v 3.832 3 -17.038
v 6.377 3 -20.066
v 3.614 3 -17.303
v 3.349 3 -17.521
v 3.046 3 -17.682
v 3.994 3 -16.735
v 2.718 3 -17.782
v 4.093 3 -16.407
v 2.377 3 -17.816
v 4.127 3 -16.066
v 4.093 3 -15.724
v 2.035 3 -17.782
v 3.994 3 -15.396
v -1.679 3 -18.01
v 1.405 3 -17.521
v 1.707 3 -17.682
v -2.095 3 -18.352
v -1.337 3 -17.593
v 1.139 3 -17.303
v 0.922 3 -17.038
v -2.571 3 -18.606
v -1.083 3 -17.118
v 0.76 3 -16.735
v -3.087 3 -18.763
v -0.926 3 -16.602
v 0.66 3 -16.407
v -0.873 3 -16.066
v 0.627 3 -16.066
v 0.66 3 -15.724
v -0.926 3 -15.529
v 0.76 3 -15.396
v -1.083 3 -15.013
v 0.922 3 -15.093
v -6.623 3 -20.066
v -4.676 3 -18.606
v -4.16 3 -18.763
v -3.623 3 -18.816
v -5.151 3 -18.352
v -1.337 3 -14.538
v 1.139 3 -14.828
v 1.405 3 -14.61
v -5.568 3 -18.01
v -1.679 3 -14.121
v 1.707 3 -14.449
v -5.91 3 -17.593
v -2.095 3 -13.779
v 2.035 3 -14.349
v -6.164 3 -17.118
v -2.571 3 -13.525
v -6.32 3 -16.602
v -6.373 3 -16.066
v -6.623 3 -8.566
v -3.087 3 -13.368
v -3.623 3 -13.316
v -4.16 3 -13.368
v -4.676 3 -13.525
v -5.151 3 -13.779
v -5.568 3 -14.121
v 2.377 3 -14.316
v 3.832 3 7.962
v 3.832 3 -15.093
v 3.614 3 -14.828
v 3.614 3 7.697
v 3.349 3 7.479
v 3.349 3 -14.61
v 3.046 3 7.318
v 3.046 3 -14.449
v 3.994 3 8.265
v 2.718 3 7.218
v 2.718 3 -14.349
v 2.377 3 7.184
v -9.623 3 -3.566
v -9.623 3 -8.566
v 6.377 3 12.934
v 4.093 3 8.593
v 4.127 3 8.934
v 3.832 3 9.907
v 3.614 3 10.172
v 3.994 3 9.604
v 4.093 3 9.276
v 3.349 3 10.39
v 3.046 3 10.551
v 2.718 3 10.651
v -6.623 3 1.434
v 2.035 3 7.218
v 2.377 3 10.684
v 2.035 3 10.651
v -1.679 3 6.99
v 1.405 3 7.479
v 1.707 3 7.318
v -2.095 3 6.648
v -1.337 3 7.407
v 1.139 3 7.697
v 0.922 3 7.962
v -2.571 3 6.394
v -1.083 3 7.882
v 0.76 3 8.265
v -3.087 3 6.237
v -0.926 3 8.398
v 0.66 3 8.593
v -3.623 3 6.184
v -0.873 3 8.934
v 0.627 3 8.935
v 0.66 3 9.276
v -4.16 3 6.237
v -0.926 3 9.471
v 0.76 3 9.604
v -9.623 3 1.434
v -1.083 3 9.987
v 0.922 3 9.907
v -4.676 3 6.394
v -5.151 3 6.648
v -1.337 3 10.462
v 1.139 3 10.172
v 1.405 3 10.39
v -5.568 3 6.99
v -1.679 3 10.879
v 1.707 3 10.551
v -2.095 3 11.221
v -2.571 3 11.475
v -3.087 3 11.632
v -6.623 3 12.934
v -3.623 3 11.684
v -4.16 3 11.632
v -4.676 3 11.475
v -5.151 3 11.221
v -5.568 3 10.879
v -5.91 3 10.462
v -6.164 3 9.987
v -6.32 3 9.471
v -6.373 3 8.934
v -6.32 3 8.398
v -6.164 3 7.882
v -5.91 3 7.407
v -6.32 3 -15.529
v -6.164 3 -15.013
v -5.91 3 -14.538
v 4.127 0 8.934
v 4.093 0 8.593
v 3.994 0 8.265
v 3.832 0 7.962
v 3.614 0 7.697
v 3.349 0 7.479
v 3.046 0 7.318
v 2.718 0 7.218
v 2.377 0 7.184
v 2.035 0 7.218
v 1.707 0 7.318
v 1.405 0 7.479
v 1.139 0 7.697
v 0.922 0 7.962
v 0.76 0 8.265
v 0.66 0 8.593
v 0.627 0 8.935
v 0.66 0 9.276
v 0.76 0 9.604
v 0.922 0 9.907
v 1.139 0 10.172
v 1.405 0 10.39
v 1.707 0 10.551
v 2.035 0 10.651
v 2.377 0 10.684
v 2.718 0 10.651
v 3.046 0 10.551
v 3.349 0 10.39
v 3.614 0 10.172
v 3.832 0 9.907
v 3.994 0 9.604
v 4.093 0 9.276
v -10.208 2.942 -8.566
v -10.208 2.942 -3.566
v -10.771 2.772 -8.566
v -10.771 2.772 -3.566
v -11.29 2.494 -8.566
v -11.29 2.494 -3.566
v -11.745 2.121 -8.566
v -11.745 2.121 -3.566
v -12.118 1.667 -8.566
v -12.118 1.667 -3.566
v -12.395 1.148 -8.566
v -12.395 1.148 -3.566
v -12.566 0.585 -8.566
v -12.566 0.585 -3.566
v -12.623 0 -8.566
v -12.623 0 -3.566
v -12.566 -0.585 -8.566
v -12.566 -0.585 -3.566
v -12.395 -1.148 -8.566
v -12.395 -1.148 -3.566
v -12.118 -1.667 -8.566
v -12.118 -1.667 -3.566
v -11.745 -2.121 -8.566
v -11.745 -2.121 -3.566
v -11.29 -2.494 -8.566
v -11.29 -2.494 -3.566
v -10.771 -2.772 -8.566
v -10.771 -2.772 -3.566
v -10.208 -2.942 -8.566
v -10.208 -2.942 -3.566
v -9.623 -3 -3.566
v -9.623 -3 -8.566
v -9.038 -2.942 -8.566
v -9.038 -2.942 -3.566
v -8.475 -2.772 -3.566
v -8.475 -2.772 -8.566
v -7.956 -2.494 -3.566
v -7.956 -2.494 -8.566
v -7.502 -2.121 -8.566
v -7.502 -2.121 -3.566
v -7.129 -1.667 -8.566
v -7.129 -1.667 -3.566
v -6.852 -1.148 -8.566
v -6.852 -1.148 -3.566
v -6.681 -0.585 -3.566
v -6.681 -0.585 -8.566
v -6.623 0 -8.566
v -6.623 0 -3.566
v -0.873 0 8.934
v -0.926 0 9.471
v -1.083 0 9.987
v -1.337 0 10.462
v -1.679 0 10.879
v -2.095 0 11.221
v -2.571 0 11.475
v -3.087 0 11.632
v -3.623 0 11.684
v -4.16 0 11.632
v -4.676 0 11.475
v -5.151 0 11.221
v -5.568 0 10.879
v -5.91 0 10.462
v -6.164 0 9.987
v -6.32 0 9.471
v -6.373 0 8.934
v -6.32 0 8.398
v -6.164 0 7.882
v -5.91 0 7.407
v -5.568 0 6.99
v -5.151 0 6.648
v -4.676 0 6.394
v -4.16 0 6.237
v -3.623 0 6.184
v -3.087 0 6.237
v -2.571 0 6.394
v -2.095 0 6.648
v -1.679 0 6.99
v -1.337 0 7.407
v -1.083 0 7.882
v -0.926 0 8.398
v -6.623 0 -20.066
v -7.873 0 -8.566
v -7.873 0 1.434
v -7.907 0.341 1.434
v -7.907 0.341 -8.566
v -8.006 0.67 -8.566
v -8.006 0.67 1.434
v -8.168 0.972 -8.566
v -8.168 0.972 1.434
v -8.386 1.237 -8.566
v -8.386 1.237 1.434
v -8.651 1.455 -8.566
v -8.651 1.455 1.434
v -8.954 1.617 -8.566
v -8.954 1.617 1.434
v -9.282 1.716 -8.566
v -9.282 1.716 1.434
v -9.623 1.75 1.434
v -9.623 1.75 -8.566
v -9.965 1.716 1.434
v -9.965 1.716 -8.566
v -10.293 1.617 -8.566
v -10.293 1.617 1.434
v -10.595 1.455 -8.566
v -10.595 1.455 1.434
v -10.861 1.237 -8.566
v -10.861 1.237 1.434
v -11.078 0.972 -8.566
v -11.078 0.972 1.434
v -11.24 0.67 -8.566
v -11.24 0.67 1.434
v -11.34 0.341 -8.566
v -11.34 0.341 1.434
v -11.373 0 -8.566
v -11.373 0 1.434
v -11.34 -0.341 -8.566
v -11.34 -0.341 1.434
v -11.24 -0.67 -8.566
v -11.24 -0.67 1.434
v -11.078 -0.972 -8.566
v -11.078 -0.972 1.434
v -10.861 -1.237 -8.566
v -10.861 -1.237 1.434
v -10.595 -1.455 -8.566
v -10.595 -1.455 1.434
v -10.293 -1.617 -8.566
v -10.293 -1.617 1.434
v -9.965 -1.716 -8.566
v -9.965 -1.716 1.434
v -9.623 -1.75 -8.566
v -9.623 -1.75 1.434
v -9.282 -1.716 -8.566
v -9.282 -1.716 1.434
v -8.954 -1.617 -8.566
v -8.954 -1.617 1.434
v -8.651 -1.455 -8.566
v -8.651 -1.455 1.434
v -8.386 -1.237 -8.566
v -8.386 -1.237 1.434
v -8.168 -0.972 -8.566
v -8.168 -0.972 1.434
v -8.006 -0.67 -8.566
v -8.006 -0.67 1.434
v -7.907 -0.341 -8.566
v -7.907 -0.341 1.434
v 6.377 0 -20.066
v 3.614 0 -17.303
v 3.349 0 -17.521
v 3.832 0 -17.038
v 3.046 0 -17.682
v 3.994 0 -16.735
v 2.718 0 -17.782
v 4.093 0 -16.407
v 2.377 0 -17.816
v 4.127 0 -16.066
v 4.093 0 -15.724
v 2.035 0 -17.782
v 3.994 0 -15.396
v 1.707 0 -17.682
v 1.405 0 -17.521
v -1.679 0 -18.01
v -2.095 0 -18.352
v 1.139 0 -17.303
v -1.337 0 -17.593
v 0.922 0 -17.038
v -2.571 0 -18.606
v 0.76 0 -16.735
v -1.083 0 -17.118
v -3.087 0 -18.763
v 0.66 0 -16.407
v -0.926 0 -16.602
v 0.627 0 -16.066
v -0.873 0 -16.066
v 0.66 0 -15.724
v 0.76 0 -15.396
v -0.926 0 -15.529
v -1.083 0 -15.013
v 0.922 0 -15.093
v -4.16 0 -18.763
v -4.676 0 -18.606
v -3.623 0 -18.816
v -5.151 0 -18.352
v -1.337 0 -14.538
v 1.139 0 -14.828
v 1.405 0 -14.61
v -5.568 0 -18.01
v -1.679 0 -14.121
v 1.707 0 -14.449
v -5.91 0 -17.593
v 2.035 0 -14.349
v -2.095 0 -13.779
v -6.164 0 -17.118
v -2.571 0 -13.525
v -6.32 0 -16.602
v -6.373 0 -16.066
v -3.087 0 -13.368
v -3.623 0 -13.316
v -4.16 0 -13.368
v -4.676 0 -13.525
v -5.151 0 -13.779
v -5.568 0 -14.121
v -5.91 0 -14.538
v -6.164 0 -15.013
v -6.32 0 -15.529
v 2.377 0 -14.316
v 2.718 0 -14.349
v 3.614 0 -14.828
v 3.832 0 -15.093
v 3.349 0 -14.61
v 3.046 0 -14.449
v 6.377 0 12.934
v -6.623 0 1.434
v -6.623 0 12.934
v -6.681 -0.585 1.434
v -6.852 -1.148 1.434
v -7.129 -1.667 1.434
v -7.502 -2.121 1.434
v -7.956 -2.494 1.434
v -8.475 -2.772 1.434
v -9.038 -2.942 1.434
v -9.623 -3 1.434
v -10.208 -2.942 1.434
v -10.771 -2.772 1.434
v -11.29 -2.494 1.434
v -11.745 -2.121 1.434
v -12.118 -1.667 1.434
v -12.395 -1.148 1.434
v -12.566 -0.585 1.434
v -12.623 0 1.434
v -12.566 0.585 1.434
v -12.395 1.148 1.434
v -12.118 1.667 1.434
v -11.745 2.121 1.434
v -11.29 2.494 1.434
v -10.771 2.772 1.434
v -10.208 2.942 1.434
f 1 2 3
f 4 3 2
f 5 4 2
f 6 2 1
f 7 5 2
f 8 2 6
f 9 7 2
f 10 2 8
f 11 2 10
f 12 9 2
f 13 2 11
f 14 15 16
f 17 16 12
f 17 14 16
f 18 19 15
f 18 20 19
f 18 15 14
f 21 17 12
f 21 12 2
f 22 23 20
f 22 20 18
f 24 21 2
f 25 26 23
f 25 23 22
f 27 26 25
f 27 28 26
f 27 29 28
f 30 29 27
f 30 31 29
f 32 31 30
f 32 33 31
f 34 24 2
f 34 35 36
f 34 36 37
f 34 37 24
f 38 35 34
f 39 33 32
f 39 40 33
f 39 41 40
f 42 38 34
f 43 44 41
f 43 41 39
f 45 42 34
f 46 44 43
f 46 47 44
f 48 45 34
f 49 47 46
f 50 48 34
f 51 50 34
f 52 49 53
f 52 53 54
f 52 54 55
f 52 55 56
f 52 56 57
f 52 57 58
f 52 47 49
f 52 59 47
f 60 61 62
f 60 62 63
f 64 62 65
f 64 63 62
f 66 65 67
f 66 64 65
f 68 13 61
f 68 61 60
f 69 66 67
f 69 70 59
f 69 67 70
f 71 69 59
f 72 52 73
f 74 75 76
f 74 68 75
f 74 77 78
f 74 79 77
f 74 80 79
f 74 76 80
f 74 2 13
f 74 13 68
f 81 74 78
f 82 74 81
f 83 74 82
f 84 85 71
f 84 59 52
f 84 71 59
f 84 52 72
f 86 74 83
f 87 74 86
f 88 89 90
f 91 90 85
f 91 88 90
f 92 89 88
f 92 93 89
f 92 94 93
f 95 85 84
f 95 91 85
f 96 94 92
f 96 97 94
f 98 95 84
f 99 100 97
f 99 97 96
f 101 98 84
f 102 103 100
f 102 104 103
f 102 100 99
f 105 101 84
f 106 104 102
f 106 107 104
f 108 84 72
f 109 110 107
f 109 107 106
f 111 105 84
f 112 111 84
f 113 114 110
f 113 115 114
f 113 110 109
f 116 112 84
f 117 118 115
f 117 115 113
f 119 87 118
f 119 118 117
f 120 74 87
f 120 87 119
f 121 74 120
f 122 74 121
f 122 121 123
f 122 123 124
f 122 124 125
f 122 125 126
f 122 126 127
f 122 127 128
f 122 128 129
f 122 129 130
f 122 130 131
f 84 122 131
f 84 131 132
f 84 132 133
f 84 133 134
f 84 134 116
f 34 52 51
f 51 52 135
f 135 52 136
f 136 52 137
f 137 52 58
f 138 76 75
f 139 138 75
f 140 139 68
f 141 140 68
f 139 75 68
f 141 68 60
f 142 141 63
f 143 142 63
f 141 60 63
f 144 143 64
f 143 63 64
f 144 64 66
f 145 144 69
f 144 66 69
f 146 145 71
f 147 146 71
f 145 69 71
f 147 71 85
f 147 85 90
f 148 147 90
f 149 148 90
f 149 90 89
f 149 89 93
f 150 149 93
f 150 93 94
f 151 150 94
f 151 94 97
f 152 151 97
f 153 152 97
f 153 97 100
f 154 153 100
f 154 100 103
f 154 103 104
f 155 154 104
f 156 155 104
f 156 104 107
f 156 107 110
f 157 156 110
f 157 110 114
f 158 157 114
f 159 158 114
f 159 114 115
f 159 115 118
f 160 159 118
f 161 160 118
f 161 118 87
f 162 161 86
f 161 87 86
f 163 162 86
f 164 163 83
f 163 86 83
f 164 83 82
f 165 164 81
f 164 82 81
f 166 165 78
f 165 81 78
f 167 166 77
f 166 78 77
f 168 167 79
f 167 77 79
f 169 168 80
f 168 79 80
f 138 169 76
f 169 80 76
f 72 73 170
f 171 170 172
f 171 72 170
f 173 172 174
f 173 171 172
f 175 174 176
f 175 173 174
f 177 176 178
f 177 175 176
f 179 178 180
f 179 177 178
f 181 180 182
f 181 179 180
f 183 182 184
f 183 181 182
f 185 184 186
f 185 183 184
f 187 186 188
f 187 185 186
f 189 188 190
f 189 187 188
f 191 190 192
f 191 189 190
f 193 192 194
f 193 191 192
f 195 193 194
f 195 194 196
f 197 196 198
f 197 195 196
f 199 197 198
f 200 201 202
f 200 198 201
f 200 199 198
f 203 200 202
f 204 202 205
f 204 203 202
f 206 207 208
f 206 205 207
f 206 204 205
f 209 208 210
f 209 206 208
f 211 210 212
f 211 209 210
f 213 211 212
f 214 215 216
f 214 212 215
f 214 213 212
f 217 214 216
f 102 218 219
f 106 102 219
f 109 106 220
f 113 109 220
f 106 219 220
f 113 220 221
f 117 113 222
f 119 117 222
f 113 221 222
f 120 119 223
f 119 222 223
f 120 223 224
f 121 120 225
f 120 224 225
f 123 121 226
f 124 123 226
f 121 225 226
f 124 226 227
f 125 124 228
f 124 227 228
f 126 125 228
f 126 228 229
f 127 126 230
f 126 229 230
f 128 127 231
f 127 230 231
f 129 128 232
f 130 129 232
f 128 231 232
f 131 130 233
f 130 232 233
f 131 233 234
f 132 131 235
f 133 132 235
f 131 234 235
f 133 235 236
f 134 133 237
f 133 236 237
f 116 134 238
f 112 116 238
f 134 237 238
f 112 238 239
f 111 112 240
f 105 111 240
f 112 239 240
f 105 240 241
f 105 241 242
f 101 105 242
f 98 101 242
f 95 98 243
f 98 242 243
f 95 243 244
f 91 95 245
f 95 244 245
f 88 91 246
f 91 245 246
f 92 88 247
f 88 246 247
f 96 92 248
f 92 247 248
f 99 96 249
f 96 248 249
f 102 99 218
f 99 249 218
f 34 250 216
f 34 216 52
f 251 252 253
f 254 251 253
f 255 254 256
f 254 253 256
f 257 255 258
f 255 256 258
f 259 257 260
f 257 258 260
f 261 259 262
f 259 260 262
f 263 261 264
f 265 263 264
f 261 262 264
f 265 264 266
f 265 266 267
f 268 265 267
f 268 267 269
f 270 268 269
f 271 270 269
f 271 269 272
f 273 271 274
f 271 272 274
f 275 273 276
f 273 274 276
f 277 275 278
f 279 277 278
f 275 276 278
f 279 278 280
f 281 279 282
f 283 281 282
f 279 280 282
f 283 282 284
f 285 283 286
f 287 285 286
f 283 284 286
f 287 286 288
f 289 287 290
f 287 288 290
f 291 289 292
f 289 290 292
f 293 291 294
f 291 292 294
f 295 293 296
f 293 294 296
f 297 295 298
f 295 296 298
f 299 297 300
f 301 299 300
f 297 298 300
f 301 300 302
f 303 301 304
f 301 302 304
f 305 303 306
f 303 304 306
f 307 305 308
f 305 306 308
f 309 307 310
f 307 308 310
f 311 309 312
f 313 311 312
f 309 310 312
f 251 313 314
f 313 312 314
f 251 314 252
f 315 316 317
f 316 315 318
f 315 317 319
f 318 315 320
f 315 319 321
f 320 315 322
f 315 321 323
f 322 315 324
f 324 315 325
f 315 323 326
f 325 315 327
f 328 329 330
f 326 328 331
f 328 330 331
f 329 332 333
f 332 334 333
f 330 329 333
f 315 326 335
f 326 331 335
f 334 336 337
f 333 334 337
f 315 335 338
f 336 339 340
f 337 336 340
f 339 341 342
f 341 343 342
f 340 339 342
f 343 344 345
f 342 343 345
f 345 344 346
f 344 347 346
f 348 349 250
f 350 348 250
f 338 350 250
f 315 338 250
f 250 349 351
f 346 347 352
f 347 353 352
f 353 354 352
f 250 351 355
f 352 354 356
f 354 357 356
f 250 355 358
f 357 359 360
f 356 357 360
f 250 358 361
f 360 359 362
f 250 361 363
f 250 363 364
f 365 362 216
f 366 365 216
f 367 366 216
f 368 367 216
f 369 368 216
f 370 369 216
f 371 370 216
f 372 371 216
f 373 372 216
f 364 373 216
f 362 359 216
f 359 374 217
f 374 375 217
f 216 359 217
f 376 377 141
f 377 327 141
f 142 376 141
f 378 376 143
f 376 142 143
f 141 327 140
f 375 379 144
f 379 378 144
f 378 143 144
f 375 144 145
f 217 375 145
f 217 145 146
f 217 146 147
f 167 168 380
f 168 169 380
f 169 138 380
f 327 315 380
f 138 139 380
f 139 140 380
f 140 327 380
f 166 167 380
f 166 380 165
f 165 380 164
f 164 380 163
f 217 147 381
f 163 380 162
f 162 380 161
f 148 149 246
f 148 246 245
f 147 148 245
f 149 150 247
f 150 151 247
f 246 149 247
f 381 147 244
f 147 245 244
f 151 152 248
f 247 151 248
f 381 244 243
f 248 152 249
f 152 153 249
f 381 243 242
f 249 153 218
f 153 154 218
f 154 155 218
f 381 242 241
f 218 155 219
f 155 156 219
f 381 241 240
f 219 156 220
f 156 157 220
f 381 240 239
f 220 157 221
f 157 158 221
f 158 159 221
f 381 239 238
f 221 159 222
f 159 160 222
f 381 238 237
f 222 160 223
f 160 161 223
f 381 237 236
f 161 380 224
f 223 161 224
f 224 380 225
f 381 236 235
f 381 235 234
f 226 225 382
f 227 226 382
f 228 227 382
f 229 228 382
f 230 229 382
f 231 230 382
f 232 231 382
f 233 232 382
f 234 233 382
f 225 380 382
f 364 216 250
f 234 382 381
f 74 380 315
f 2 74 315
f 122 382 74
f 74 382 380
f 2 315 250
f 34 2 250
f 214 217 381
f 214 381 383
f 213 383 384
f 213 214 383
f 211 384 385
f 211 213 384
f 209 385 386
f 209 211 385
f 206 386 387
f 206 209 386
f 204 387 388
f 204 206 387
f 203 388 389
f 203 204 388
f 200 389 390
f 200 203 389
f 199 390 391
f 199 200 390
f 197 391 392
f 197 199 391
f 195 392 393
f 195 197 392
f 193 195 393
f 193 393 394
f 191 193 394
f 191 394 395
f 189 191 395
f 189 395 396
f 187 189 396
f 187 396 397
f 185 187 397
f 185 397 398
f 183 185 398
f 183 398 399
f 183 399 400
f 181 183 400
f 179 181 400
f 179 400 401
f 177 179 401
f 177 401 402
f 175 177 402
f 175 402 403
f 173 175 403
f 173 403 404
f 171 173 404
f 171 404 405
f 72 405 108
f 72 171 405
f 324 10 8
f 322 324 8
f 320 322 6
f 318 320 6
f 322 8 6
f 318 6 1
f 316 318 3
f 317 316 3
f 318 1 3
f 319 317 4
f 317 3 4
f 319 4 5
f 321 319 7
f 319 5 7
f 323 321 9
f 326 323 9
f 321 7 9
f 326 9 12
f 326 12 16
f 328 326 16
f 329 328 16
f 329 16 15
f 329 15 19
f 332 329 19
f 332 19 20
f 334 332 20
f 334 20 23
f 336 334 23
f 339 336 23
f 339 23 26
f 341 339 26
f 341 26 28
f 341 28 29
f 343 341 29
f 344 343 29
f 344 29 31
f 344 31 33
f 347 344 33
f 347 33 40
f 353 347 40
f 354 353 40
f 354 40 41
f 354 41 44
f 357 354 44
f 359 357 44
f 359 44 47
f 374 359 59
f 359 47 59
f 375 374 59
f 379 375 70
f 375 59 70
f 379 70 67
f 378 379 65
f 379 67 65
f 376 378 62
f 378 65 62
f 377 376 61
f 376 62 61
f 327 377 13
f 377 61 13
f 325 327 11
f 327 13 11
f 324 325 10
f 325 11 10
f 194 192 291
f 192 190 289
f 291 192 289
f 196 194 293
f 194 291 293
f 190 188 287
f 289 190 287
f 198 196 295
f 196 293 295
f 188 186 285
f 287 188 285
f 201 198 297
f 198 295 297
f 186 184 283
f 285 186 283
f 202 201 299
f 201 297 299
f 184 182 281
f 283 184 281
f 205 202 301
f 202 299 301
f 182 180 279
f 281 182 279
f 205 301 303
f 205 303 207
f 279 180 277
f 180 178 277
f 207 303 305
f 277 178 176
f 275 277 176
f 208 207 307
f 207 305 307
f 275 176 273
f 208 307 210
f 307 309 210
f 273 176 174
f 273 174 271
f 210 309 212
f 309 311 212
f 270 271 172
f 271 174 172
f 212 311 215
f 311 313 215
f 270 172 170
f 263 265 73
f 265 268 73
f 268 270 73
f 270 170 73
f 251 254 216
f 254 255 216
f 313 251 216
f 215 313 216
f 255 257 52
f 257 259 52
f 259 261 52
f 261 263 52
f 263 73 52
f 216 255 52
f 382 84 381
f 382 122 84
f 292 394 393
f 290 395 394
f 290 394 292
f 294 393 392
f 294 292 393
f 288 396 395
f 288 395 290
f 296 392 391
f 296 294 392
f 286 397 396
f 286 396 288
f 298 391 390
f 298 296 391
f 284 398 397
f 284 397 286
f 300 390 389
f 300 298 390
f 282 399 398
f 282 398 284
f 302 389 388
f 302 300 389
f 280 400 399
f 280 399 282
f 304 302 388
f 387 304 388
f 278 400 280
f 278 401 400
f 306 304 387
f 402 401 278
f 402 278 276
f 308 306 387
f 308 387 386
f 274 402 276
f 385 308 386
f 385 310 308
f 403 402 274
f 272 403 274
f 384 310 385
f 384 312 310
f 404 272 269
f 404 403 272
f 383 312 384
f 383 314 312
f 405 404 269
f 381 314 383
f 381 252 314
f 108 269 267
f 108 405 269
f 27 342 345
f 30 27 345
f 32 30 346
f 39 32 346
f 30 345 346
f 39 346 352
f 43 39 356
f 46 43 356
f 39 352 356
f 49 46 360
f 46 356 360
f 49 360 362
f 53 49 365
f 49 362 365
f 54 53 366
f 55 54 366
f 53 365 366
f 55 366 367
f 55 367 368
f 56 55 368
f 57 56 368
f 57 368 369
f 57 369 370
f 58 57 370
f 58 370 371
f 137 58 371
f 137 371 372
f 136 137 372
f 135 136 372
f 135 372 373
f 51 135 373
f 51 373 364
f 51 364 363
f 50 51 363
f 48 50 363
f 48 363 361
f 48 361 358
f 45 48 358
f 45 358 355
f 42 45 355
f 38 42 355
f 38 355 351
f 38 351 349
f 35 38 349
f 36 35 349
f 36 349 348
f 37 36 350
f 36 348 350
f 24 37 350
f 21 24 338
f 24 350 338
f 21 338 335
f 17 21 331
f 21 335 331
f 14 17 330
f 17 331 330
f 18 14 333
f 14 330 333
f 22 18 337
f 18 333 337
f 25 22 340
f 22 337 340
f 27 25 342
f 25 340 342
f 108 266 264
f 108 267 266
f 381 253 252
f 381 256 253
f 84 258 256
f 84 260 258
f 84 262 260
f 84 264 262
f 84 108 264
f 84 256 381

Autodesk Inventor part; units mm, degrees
ref_plane "YZ Plane" through (0, 0, 0) normal (1, 0, 0) x (0, 1, 0)
ref_plane "XZ Plane" through (0, 0, 0) normal (0, 1, 0) x (-1, 0, 0)
ref_plane "XY Plane" through (0, 0, 0) normal (0, 0, 1) x (1, 0, 0)
sketch "Sketch1" plane through (0, 0, 0) normal (0, 1, 0) x (-1, 0, 0)
  line L0 (9.6232, 12.9345) -> (-6.3768, 12.9345)
  line L1 (-6.3768, 12.9345) -> (-6.3768, -20.0655)
  line L2 (-6.3768, -20.0655) -> (9.6232, -20.0655)
  line L3 (9.6232, -20.0655) -> (9.6232, 12.9345)
  dimension "d3" = 16
  dimension "d4" = 33
extrude "Extrusion1" add sketch "Sketch1" along normal blind 3
sketch "Sketch2" plane through (0, 3, 0) normal (0, 1, 0) x (1, 0, 0)
  circle A0 centre (2.3768, -8.9345) radius 1.75
  circle A1 centre (2.3768, 16.0655) radius 1.75
  line L0 (6.3768, -12.9345) -> (6.3768, 20.0655) projected
  line L1 (-9.6232, -12.9345) -> (6.3768, -12.9345) projected
  line L2 (6.3768, 20.0655) -> (-9.6232, 20.0655) projected
  point P0 (0, 0)
  dimension "d7" = 3.5
  dimension "d8" = 3.5
  dimension "d9" = 4
  dimension "d10" = 4
  dimension "d11" = 4
  dimension "d12" = 4
extrude "Extrusion2" cut sketch "Sketch2" against normal through all
ref_plane "Work Plane1" through (-9.6232, 0, -3.5655) normal (0, 0, 1) x (1, 0, 0)
sketch "Sketch4" plane through (-9.6232, 0, -3.5655) normal (0, 0, 1) x (1, 0, 0)
  line L0 (0, 0) -> (0, 3) projected
  circle A0 centre (0, 0) radius 3
  point P0 (9.6232, 0)
  dimension "d17" = 6
extrude "Extrusion3" add sketch "Sketch4" along normal mid plane 10
sketch "Sketch5" plane through (-9.6232, 0, 12.9345) normal (0, 0, 1) x (1, 0, 0)
  line L0 (0, 3) -> (0, 0) projected
  line L1 (3, -3) -> (-3, -3)
  line L2 (-3, -3) -> (-3, 3)
  line L3 (-3, 3) -> (3, 3)
  line L4 (3, 3) -> (3, -3)
  point P0 (9.6232, 0)
  point P1 (0, 2.5)
extrude "Extrusion4" cut sketch "Sketch5" against normal blind 11.5
mirror "Mirror1" about plane through (-9.6232, 0, -3.5655) normal (0, 0, 1) of "Extrusion4"
sketch "Sketch6" plane through (-9.6232, 0, 1.4345) normal (0, 0, 1) x (1, 0, 0)
  circle A0 centre (0, 0) radius 1.75
  point P0 (9.6232, 0)
  dimension "d24" = 3.5
extrude "Extrusion5" cut sketch "Sketch6" against normal up to next
sketch "Sketch7" plane through (0, 0, 0) normal (0, -1, 0) x (1, 0, 0)
  circle A0 centre (-3.6232, -16.0655) radius 2.75
  circle A1 centre (-3.6232, 8.9345) radius 2.75
  line L0 (6.3768, -20.0655) -> (-6.6232, -20.0655) projected
  line L1 (-6.6232, 12.9345) -> (6.3768, 12.9345) projected
  line L2 (-6.6232, 12.9345) -> (-6.6232, 1.4345) projected
  point P0 (0, 0)
  point P1 (-6.6232, 1.4345)
  dimension "d27" = 5.5
  dimension "d28" = 5.5
  dimension "d29" = 4
  dimension "d30" = 4
  dimension "d31" = 3
  dimension "d32" = 3
extrude "Extrusion6" cut sketch "Sketch7" against normal through all
equation "\"d11\" = d9"
equation "\"d12\" = d10"
equation "\"d30\" = d29"
equation "\"d32\" = d31"
properties part number "k2_hinge1_top"
